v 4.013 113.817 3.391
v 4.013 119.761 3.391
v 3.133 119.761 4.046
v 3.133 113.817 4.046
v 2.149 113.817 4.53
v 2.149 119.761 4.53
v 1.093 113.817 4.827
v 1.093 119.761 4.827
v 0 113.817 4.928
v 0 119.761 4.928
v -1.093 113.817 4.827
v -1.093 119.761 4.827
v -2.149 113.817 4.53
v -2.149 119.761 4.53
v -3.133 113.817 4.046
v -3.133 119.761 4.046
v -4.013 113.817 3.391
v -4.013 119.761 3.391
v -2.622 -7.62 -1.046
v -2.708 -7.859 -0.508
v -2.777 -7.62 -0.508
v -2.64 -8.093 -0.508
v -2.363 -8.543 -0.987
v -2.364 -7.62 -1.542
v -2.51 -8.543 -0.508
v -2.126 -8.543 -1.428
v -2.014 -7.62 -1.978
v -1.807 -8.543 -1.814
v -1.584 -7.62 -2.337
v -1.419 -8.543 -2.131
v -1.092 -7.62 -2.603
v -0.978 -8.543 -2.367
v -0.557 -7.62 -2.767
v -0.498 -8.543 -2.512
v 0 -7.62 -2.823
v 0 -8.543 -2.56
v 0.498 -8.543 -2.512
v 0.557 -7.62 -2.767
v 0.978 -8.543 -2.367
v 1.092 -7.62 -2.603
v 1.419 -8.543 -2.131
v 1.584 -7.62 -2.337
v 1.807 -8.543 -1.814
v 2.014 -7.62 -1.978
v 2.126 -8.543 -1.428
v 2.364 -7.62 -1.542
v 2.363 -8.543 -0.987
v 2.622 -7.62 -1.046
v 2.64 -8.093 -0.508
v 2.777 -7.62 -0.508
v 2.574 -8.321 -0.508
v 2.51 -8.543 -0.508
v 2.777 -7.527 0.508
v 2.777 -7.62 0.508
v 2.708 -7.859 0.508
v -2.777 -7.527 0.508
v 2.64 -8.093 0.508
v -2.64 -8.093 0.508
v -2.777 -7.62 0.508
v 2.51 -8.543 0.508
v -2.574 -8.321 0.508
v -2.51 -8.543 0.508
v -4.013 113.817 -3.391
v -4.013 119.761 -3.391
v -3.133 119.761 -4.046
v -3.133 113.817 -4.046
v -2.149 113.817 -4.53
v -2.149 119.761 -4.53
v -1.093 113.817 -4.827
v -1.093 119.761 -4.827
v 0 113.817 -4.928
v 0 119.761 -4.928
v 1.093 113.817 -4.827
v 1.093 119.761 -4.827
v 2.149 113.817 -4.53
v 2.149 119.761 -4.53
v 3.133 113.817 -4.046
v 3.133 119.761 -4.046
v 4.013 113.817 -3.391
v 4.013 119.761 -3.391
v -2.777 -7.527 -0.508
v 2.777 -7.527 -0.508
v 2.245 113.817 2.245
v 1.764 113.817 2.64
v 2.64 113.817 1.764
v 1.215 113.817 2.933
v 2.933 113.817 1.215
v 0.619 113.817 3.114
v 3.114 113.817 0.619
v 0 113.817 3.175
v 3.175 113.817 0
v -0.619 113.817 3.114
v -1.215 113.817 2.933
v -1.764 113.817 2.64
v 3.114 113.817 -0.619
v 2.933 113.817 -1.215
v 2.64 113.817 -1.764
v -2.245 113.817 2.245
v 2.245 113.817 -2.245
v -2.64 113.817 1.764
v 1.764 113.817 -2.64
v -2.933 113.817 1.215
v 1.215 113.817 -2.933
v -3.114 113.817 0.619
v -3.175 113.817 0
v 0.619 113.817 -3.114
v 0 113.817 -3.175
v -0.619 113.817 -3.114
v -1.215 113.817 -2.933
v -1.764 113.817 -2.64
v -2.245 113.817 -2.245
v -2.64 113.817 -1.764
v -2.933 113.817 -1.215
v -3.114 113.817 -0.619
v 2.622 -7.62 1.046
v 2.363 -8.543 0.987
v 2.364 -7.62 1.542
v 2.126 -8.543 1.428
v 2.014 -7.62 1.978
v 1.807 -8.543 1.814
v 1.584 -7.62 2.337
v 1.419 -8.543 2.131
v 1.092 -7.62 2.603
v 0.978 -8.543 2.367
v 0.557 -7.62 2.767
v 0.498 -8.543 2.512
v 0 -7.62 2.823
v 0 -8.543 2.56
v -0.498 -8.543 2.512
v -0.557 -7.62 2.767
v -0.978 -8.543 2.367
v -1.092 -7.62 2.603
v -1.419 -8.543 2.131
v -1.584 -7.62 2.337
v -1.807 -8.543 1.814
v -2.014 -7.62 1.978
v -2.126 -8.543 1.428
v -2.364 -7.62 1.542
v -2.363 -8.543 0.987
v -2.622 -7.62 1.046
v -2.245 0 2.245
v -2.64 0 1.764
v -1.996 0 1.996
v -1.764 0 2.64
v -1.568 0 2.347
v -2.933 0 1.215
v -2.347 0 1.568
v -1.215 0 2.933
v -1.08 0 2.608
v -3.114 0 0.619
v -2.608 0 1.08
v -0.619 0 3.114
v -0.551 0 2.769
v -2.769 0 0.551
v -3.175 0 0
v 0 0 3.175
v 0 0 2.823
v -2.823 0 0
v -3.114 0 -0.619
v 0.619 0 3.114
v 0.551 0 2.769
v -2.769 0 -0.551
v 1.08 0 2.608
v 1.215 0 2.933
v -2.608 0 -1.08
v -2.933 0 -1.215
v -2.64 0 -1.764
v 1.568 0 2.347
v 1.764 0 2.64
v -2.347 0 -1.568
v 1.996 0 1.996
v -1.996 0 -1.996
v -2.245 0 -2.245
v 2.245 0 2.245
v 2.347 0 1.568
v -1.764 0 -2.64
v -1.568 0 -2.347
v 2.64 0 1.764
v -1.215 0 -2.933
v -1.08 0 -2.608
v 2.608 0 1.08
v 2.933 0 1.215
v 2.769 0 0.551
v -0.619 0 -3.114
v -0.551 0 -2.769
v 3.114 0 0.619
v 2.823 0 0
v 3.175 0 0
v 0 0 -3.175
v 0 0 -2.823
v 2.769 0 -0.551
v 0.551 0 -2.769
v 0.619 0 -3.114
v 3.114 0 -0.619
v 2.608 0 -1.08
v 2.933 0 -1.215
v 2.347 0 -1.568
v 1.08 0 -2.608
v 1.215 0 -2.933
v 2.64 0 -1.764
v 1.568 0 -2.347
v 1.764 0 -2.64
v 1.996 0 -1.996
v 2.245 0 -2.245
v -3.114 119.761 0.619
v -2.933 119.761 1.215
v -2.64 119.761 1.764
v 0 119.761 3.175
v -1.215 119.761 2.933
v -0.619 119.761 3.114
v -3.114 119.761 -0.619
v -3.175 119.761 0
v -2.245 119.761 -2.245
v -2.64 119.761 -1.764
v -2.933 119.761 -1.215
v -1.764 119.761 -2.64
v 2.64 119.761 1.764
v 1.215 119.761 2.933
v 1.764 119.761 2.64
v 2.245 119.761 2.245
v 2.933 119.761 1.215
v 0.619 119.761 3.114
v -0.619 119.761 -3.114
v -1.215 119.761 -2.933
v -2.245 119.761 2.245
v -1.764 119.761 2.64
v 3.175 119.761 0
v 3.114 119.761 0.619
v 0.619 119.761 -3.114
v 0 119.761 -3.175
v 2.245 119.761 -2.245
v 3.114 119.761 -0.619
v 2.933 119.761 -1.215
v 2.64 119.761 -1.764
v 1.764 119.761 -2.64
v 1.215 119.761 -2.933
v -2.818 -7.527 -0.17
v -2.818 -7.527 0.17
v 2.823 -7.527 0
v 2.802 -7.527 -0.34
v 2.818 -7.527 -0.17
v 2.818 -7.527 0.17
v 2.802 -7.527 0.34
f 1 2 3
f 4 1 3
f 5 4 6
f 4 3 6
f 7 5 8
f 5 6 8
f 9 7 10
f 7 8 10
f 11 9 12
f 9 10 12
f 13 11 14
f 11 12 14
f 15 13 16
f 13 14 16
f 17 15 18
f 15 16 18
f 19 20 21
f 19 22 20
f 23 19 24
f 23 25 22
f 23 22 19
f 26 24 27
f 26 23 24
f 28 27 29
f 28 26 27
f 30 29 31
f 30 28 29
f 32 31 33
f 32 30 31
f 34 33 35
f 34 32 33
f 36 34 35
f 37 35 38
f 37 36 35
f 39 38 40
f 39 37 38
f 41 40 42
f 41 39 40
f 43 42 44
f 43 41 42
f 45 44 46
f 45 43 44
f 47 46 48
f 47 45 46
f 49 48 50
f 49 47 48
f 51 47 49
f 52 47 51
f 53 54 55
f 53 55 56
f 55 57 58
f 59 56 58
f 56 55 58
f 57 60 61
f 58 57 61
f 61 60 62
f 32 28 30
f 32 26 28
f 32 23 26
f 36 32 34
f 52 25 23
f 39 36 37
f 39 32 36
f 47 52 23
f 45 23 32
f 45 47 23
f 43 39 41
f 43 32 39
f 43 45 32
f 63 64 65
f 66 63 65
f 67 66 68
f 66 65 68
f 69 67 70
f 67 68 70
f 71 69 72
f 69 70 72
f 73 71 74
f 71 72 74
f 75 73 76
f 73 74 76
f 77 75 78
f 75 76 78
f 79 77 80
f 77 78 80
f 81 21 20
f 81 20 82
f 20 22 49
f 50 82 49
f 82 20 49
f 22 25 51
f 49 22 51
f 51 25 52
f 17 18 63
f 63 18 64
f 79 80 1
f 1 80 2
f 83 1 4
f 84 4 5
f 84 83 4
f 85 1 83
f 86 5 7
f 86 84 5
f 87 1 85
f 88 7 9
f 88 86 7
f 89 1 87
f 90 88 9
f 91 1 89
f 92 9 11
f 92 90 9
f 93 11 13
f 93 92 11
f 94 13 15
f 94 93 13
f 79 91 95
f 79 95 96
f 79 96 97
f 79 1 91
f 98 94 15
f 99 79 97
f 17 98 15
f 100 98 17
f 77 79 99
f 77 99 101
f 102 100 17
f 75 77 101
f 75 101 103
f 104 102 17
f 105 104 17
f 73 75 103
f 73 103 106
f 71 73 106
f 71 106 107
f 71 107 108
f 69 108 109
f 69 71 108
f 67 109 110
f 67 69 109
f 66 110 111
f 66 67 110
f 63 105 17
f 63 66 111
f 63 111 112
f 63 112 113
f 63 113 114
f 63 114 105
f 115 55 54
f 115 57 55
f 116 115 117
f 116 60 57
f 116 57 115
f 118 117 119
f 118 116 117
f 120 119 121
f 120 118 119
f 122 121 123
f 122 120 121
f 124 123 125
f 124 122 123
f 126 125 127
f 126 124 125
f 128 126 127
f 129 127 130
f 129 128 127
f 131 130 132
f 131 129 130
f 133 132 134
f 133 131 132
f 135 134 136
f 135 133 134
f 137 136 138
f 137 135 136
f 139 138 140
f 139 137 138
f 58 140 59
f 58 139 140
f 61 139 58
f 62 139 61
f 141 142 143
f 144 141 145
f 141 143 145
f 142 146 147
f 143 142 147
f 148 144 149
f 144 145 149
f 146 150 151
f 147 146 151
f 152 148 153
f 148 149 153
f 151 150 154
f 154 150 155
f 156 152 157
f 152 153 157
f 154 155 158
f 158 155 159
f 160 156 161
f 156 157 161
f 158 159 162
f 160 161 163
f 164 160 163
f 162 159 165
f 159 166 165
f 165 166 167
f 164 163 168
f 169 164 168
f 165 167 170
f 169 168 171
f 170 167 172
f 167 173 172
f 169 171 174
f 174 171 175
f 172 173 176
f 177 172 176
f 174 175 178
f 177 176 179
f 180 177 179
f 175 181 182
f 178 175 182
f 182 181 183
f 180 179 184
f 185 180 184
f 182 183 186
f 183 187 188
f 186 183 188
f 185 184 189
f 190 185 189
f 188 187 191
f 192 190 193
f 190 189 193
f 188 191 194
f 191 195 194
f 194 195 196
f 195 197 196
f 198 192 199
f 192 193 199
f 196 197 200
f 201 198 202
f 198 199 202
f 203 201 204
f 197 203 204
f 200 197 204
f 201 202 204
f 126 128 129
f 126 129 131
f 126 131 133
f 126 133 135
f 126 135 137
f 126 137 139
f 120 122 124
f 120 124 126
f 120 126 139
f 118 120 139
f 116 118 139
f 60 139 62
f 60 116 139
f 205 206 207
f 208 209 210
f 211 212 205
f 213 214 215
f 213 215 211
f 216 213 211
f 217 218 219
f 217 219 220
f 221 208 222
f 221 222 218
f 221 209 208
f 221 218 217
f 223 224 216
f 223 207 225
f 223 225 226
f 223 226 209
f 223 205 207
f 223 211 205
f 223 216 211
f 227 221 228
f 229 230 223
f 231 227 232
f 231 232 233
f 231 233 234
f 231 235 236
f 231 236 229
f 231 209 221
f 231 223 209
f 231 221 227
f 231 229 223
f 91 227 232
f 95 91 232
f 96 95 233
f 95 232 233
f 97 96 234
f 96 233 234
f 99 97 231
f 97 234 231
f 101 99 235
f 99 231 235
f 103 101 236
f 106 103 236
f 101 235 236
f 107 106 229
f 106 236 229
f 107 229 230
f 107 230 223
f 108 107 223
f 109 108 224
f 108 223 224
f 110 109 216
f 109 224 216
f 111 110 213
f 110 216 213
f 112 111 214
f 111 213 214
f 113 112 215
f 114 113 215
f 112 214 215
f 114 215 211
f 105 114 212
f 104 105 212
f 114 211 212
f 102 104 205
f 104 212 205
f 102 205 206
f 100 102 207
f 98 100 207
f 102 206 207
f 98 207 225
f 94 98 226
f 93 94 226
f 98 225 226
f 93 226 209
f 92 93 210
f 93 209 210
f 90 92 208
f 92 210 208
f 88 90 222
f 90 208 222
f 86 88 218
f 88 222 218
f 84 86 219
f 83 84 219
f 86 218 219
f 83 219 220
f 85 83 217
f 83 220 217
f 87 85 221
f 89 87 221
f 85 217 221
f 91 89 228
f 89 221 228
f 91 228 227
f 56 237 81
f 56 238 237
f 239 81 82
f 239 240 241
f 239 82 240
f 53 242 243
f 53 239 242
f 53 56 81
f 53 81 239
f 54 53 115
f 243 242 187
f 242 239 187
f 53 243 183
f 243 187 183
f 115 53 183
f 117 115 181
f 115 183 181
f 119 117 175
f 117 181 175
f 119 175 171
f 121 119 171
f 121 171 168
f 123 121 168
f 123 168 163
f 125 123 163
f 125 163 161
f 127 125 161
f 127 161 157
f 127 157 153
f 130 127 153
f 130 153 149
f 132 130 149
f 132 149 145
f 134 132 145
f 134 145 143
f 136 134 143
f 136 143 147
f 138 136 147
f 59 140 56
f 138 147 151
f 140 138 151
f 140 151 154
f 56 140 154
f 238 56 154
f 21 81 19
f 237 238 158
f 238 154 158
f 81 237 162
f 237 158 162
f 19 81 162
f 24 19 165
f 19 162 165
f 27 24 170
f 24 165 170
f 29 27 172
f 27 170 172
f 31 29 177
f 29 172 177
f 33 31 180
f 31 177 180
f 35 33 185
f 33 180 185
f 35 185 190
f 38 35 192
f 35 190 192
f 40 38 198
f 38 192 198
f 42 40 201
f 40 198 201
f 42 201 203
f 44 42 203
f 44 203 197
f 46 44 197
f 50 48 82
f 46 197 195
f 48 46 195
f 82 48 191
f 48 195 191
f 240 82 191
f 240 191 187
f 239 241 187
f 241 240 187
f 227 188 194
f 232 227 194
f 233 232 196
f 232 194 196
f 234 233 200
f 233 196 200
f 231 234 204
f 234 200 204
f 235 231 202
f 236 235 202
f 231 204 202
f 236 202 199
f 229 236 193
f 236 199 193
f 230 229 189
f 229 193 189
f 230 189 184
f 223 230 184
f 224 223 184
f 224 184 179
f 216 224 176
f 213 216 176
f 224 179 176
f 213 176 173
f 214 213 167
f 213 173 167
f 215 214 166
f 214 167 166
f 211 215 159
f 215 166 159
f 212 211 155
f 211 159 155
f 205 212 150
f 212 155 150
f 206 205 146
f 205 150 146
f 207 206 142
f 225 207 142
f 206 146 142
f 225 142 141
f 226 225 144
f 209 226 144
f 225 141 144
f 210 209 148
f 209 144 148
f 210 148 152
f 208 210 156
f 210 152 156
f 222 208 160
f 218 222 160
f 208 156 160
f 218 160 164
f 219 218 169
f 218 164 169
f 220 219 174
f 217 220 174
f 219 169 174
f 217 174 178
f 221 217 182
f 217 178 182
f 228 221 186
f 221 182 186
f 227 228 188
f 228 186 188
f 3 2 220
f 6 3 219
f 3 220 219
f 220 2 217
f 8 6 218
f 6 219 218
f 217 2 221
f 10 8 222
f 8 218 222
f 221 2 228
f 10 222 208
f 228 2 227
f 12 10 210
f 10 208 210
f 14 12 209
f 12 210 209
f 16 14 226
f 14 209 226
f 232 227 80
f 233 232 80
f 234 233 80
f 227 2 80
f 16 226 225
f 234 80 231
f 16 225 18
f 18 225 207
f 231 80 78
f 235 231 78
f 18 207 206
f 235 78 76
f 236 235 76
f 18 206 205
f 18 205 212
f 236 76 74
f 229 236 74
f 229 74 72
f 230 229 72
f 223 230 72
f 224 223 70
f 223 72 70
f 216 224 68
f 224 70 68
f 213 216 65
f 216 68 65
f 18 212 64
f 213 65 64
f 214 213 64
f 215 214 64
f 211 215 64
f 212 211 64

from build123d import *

# Parameters (mm, degrees)
SKETCH1_R           = 3.175
BOSS_EXTRUDE1_DEPTH = 119.761
SKETCH2_R           = 2.822872997
BOSS_EXTRUDE5_DEPTH = 7.62
CUT_EXTRUDE1_DEPTH  = 1.016
SKETCH12_R          = 3.175
BOSS_EXTRUDE6_DEPTH = 5.9436


with BuildPart() as part:
    # Sketch1 → Boss-Extrude1 (new body)
    with BuildSketch(Plane(origin=(0, 0, 0), x_dir=(1, 0, 0), z_dir=(0, 1, 0))):
        Circle(SKETCH1_R)
    extrude(amount=BOSS_EXTRUDE1_DEPTH)

    # Sketch2 → Boss-Extrude5 (add)
    with BuildSketch(Plane.XZ):
        Circle(SKETCH2_R)
    extrude(amount=BOSS_EXTRUDE5_DEPTH)

    # Sketch10 → Revolve1 (revolve)
    with BuildSketch(Plane(origin=(0, 0, 0), x_dir=(0, 0, -1), z_dir=(1, 0, 0))):
        Polygon((2.822872997, -7.62), (2.560464759, -8.542545863), (0, -8.542545863), (0, -7.62), align=None)
    revolve(axis=Axis((0, 0, 0), (0, -1, 0)))

    # Sketch11 → Cut-Extrude1 (cut)
    with BuildSketch(Plane.XZ.offset(8.542545863)):
        with BuildLine():
            Line((2.509564859, 0.508), (0, 0.508))
            Line((0, 0.508), (0, -0.508))
            Line((0, -0.508), (2.509564859, -0.508))
            ThreePointArc((2.509564859, -0.508), (2.547708005, -0.255271816), (2.560464759, 0))
            ThreePointArc((2.560464759, 0), (2.547708005, 0.255271816), (2.509564859, 0.508))
        make_face()
        with BuildLine():
            Line((0, -0.508), (0, 0.508))
            Line((0, 0.508), (-2.509564859, 0.508))
            ThreePointArc((-2.509564859, 0.508), (-2.560464759, 0), (-2.509564859, -0.508))
            Line((-2.509564859, -0.508), (0, -0.508))
        make_face()
        with BuildLine():
            ThreePointArc((-2.509564859, -0.508), (-2.560464759, 0), (-2.509564859, 0.508))
            Line((-2.509564859, 0.508), (-2.854276167, 0.508))
            Line((-2.854276167, 0.508), (-2.854276167, -0.508))
            Line((-2.854276167, -0.508), (-2.509564859, -0.508))
        make_face()
        with BuildLine():
            Line((2.854276167, 0.508), (2.509564859, 0.508))
            ThreePointArc((2.509564859, 0.508), (2.547708005, 0.255271816), (2.560464759, 0))
            ThreePointArc((2.560464759, 0), (2.547708005, -0.255271816), (2.509564859, -0.508))
            Line((2.509564859, -0.508), (2.854276167, -0.508))
            Line((2.854276167, -0.508), (2.854276167, 0.508))
        make_face()
    extrude(amount=-CUT_EXTRUDE1_DEPTH, mode=Mode.SUBTRACT)


with BuildPart() as body_2:
    # Sketch12 → Boss-Extrude6 (new body)
    with BuildSketch(Plane(origin=(0, 119.761, 0), x_dir=(1, 0, 0), z_dir=(0, 1, 0))):
        with BuildLine():
            Line((-4.0132, -3.3909), (-4.0132, 3.3909))
            ThreePointArc((-4.0132, 3.3909), (0, 4.9276), (4.0132, 3.3909))
            Line((4.0132, 3.3909), (4.0132, -3.3909))
            ThreePointArc((4.0132, -3.3909), (0, -4.9276), (-4.0132, -3.3909))
        make_face()
        Circle(SKETCH12_R, mode=Mode.SUBTRACT)
    extrude(amount=-BOSS_EXTRUDE6_DEPTH)


solid = Compound([part.part, body_2.part])
